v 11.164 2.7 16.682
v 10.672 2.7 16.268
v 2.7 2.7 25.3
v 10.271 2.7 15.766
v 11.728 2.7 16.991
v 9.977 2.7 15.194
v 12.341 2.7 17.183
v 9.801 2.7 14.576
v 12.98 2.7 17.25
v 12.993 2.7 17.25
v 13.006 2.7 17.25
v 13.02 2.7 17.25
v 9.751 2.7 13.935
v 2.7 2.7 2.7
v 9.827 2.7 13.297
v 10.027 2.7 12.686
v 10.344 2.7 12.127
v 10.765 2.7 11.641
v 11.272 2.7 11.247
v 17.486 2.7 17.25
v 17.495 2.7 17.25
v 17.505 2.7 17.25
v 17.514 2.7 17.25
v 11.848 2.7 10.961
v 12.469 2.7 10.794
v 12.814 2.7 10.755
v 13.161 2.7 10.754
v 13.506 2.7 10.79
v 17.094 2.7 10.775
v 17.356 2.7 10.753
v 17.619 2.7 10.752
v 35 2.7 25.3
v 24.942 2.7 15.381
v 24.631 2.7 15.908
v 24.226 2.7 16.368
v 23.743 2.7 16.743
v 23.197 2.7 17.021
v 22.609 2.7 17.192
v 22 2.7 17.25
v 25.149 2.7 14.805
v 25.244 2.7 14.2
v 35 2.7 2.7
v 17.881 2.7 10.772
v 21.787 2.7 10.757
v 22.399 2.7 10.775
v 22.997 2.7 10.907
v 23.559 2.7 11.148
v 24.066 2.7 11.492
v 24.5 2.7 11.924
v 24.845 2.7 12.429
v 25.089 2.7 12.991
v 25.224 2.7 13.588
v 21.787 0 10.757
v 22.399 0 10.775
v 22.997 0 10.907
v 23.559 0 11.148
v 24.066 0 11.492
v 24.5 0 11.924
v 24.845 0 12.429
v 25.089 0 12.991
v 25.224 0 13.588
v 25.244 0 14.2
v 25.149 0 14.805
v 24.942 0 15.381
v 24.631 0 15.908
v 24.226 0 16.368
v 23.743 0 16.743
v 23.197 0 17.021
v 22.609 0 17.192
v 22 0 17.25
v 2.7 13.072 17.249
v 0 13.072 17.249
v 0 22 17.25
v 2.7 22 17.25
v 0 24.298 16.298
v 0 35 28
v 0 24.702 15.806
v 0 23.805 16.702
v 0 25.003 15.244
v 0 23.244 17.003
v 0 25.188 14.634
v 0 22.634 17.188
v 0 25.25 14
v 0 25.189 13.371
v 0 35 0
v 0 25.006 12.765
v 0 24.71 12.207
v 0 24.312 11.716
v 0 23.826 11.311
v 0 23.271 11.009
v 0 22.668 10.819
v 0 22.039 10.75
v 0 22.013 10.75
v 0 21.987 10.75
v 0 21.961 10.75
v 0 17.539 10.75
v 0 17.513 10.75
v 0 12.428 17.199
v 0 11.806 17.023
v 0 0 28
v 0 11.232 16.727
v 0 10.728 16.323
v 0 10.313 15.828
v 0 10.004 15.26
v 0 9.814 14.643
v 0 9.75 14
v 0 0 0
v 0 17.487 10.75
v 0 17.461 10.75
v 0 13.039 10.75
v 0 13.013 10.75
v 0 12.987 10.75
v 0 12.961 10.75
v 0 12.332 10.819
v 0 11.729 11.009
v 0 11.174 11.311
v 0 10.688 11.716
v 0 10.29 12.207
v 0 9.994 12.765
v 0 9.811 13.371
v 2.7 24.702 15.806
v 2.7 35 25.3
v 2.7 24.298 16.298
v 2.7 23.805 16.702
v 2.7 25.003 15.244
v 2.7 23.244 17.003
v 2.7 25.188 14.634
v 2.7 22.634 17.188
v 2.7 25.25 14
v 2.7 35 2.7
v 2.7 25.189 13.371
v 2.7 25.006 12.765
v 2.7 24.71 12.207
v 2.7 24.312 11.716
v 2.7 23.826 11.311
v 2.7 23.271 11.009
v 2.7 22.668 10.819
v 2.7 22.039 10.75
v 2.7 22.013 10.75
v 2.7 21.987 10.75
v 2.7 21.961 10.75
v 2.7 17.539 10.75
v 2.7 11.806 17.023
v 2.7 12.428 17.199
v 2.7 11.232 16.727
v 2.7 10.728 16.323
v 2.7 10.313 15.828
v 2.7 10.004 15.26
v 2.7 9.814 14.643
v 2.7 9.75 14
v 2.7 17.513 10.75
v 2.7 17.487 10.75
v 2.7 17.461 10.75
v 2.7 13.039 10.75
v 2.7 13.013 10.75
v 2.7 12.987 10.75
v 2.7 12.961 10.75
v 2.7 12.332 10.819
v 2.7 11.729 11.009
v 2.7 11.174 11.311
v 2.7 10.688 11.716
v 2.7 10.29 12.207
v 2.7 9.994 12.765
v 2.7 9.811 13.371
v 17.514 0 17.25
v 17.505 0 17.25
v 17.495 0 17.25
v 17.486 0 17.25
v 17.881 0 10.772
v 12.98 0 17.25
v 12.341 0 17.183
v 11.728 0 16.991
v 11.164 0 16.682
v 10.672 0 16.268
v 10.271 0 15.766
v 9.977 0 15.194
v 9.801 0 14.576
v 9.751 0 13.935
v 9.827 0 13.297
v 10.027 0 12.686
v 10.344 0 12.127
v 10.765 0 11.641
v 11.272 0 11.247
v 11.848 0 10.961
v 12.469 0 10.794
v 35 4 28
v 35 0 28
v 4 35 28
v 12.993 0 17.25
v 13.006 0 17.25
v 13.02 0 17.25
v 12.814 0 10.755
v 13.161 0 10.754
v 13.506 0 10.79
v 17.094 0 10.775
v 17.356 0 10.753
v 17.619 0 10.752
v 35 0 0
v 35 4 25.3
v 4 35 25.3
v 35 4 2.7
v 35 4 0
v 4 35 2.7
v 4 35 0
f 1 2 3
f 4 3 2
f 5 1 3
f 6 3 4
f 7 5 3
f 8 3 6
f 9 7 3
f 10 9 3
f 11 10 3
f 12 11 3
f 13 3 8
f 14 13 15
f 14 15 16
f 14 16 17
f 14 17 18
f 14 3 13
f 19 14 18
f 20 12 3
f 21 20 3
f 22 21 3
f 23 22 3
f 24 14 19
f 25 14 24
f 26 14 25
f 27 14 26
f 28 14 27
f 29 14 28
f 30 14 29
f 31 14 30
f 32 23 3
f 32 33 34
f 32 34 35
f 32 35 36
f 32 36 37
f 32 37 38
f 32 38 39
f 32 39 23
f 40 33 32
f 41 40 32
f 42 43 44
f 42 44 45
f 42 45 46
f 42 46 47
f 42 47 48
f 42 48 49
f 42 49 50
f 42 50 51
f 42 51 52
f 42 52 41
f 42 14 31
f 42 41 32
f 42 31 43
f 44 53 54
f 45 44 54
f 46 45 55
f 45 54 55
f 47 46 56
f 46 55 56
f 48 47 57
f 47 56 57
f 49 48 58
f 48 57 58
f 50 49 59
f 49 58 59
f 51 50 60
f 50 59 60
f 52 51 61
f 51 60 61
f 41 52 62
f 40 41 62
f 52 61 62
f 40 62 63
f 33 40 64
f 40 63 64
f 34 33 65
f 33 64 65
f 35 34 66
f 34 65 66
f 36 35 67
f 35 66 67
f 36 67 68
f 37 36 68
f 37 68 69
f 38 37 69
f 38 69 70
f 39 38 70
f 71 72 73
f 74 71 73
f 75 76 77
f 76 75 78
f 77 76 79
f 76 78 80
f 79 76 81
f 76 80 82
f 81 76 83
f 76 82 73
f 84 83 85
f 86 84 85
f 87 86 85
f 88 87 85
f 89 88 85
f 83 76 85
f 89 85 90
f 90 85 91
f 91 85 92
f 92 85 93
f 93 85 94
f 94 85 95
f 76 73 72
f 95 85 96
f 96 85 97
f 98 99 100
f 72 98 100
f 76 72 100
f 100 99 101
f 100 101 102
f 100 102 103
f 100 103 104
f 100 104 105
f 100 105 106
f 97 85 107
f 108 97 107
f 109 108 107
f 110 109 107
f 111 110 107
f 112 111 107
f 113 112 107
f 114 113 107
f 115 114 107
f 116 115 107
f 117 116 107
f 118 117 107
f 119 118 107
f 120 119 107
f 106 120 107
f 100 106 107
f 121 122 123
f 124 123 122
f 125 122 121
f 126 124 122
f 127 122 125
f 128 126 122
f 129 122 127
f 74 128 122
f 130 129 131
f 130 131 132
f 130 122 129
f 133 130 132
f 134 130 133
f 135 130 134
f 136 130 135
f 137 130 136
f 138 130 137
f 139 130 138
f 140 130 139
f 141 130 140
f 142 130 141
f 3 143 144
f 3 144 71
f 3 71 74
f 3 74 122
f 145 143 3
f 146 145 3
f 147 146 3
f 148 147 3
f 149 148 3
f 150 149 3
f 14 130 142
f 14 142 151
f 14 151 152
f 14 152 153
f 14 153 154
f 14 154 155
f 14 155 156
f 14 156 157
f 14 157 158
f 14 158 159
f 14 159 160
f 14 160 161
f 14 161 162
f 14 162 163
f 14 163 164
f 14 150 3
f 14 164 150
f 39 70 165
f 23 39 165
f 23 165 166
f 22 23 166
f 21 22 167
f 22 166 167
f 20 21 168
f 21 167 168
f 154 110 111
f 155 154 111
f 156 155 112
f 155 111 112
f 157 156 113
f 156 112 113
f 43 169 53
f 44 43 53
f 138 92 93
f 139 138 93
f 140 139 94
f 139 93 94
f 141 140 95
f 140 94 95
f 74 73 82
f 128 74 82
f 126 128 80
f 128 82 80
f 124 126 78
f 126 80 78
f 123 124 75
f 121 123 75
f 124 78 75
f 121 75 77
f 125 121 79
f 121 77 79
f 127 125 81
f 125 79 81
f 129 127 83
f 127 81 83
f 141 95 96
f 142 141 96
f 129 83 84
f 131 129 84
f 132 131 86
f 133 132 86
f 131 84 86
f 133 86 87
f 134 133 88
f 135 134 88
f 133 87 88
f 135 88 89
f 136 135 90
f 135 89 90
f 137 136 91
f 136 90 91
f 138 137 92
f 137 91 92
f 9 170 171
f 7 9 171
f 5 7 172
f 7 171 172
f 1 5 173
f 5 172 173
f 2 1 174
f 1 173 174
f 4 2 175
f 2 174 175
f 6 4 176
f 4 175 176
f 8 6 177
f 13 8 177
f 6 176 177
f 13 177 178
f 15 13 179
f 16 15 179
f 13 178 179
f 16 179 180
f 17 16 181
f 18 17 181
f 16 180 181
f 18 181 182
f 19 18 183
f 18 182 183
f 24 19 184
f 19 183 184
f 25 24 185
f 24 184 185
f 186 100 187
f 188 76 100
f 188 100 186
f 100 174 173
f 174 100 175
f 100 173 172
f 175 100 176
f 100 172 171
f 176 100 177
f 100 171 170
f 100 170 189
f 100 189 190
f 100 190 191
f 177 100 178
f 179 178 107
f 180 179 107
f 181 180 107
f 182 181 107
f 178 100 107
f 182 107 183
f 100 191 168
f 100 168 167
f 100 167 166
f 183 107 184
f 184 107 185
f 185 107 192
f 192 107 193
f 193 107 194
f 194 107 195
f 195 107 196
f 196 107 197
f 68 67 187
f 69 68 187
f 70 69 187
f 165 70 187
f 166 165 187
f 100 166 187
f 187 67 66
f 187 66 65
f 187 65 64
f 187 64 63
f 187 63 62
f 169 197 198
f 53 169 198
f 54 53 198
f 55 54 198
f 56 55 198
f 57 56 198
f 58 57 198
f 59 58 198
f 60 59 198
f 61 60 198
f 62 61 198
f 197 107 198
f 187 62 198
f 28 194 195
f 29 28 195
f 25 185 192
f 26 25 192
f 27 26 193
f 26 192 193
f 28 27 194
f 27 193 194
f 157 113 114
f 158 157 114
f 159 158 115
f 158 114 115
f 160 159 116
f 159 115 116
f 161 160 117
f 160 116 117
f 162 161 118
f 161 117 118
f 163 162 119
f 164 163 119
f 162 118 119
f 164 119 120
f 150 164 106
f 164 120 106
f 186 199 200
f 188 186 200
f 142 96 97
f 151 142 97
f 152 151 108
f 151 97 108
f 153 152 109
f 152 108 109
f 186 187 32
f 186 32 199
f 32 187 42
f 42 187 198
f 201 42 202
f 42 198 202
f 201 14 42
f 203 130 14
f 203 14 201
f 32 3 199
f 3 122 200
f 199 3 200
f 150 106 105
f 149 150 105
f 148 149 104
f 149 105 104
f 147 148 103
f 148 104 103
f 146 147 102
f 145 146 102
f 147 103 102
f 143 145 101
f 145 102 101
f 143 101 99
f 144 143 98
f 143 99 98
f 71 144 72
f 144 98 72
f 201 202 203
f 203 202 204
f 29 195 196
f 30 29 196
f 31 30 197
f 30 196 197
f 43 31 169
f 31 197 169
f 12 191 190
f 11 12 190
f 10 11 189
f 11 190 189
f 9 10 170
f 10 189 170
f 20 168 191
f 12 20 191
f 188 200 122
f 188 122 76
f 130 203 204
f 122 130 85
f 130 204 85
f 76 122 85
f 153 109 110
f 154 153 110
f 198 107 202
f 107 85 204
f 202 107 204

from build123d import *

# Parameters (mm, degrees)
F1_DEPTH = 28
F2_T     = -2.7
F4_DEPTH = 25
F6_DEPTH = 25


with BuildPart() as f1:
    # F0 (on Top) → F1 (new body)
    with BuildSketch(Plane.XY):
        Polygon((0, 35), (0, 0), (35, 0), (35, 4), (4, 35), align=None)
    extrude(amount=F1_DEPTH)

    # F2
    f2_openings = [f1.faces().sort_by_distance(p)[0] for p in [
        (19.5, 19.5, 14),
        (2, 35, 14),
        (35, 2, 14),
    ]]
    offset(amount=F2_T, openings=f2_openings)

    # F3 (on face) → F4 (cut)
    with BuildSketch(Plane(origin=(0, 0, 0), x_dir=(0, -1, 0), z_dir=(-1, 0, 0))):
        with BuildLine():
            Line((-17.460573, 10.750239), (-17.539427, 10.750239))
            ThreePointArc((-17.539427, 10.750239), (-17.5, 10.75), (-17.460573, 10.750239))
        make_face()
        with BuildLine():
            Line((-21.960573, 10.750239), (-17.539427, 10.750239))
            Line((-17.539427, 10.750239), (-17.460573, 10.750239))
            Line((-17.460573, 10.750239), (-13.039427, 10.750239))
            Line((-13.039427, 10.750239), (-12.960573, 10.750239))
            ThreePointArc((-12.960573, 10.750239), (-10.688005, 11.715885), (-9.75, 14))
            Line((-9.75, 14), (-13, 14))
            Line((-13, 14), (-17.5, 14))
            Line((-17.5, 14), (-22, 14))
            Line((-22, 14), (-25.25, 14))
            ThreePointArc((-25.25, 14), (-24.311995, 11.715885), (-22.039427, 10.750239))
            Line((-22.039427, 10.750239), (-21.960573, 10.750239))
        make_face()
        with BuildLine():
            ThreePointArc((-22.039427, 10.750239), (-22, 10.75), (-21.960573, 10.750239))
            Line((-21.960573, 10.750239), (-22.039427, 10.750239))
        make_face()
        with BuildLine():
            Line((-12.960573, 10.750239), (-13.039427, 10.750239))
            ThreePointArc((-13.039427, 10.750239), (-13, 10.75), (-12.960573, 10.750239))
        make_face()
        with BuildLine():
            ThreePointArc((-21.999708, 17.25), (-24.297994, 16.2982), (-25.25, 14))
            Line((-25.25, 14), (-22, 14))
            Line((-22, 14), (-17.5, 14))
            Line((-17.5, 14), (-13, 14))
            Line((-13, 14), (-9.75, 14))
            ThreePointArc((-9.75, 14), (-10.727581, 16.323491), (-13.072222, 17.249197))
            Line((-13.072222, 17.249197), (-21.999708, 17.25))
        make_face()
    extrude(amount=-F4_DEPTH, mode=Mode.SUBTRACT)

    # F5 (on face) → F6 (cut)
    with BuildSketch(Plane.XZ):
        with BuildLine():
            Line((17.880831, 10.77239), (21.787071, 10.756983))
            ThreePointArc((21.787071, 10.756983), (25.248254, 13.893489), (21.999979, 17.25))
            Line((21.999979, 17.25), (17.513798, 17.249971))
            ThreePointArc((17.513798, 17.249971), (17.499979, 17.25), (17.48616, 17.249971))
            Line((17.48616, 17.249971), (13.019522, 17.249941))
            ThreePointArc((13.019522, 17.249941), (12.999979, 17.25), (12.980436, 17.249941))
            ThreePointArc((12.980436, 17.249941), (9.760165, 14.256843), (12.46861, 10.793737))
            Line((12.46861, 10.793737), (13.506082, 10.789645))
            Line((13.506082, 10.789645), (17.093721, 10.775494))
            Line((17.093721, 10.775494), (17.880831, 10.77239))
        make_face()
        with BuildLine():
            ThreePointArc((17.093721, 10.775494), (17.487181, 10.750025), (17.880831, 10.77239))
            Line((17.880831, 10.77239), (17.093721, 10.775494))
        make_face()
        with BuildLine():
            ThreePointArc((12.46861, 10.793737), (12.987181, 10.750025), (13.506082, 10.789645))
            Line((13.506082, 10.789645), (12.46861, 10.793737))
        make_face()
    extrude(amount=-F6_DEPTH, mode=Mode.SUBTRACT)


solid = f1.part
